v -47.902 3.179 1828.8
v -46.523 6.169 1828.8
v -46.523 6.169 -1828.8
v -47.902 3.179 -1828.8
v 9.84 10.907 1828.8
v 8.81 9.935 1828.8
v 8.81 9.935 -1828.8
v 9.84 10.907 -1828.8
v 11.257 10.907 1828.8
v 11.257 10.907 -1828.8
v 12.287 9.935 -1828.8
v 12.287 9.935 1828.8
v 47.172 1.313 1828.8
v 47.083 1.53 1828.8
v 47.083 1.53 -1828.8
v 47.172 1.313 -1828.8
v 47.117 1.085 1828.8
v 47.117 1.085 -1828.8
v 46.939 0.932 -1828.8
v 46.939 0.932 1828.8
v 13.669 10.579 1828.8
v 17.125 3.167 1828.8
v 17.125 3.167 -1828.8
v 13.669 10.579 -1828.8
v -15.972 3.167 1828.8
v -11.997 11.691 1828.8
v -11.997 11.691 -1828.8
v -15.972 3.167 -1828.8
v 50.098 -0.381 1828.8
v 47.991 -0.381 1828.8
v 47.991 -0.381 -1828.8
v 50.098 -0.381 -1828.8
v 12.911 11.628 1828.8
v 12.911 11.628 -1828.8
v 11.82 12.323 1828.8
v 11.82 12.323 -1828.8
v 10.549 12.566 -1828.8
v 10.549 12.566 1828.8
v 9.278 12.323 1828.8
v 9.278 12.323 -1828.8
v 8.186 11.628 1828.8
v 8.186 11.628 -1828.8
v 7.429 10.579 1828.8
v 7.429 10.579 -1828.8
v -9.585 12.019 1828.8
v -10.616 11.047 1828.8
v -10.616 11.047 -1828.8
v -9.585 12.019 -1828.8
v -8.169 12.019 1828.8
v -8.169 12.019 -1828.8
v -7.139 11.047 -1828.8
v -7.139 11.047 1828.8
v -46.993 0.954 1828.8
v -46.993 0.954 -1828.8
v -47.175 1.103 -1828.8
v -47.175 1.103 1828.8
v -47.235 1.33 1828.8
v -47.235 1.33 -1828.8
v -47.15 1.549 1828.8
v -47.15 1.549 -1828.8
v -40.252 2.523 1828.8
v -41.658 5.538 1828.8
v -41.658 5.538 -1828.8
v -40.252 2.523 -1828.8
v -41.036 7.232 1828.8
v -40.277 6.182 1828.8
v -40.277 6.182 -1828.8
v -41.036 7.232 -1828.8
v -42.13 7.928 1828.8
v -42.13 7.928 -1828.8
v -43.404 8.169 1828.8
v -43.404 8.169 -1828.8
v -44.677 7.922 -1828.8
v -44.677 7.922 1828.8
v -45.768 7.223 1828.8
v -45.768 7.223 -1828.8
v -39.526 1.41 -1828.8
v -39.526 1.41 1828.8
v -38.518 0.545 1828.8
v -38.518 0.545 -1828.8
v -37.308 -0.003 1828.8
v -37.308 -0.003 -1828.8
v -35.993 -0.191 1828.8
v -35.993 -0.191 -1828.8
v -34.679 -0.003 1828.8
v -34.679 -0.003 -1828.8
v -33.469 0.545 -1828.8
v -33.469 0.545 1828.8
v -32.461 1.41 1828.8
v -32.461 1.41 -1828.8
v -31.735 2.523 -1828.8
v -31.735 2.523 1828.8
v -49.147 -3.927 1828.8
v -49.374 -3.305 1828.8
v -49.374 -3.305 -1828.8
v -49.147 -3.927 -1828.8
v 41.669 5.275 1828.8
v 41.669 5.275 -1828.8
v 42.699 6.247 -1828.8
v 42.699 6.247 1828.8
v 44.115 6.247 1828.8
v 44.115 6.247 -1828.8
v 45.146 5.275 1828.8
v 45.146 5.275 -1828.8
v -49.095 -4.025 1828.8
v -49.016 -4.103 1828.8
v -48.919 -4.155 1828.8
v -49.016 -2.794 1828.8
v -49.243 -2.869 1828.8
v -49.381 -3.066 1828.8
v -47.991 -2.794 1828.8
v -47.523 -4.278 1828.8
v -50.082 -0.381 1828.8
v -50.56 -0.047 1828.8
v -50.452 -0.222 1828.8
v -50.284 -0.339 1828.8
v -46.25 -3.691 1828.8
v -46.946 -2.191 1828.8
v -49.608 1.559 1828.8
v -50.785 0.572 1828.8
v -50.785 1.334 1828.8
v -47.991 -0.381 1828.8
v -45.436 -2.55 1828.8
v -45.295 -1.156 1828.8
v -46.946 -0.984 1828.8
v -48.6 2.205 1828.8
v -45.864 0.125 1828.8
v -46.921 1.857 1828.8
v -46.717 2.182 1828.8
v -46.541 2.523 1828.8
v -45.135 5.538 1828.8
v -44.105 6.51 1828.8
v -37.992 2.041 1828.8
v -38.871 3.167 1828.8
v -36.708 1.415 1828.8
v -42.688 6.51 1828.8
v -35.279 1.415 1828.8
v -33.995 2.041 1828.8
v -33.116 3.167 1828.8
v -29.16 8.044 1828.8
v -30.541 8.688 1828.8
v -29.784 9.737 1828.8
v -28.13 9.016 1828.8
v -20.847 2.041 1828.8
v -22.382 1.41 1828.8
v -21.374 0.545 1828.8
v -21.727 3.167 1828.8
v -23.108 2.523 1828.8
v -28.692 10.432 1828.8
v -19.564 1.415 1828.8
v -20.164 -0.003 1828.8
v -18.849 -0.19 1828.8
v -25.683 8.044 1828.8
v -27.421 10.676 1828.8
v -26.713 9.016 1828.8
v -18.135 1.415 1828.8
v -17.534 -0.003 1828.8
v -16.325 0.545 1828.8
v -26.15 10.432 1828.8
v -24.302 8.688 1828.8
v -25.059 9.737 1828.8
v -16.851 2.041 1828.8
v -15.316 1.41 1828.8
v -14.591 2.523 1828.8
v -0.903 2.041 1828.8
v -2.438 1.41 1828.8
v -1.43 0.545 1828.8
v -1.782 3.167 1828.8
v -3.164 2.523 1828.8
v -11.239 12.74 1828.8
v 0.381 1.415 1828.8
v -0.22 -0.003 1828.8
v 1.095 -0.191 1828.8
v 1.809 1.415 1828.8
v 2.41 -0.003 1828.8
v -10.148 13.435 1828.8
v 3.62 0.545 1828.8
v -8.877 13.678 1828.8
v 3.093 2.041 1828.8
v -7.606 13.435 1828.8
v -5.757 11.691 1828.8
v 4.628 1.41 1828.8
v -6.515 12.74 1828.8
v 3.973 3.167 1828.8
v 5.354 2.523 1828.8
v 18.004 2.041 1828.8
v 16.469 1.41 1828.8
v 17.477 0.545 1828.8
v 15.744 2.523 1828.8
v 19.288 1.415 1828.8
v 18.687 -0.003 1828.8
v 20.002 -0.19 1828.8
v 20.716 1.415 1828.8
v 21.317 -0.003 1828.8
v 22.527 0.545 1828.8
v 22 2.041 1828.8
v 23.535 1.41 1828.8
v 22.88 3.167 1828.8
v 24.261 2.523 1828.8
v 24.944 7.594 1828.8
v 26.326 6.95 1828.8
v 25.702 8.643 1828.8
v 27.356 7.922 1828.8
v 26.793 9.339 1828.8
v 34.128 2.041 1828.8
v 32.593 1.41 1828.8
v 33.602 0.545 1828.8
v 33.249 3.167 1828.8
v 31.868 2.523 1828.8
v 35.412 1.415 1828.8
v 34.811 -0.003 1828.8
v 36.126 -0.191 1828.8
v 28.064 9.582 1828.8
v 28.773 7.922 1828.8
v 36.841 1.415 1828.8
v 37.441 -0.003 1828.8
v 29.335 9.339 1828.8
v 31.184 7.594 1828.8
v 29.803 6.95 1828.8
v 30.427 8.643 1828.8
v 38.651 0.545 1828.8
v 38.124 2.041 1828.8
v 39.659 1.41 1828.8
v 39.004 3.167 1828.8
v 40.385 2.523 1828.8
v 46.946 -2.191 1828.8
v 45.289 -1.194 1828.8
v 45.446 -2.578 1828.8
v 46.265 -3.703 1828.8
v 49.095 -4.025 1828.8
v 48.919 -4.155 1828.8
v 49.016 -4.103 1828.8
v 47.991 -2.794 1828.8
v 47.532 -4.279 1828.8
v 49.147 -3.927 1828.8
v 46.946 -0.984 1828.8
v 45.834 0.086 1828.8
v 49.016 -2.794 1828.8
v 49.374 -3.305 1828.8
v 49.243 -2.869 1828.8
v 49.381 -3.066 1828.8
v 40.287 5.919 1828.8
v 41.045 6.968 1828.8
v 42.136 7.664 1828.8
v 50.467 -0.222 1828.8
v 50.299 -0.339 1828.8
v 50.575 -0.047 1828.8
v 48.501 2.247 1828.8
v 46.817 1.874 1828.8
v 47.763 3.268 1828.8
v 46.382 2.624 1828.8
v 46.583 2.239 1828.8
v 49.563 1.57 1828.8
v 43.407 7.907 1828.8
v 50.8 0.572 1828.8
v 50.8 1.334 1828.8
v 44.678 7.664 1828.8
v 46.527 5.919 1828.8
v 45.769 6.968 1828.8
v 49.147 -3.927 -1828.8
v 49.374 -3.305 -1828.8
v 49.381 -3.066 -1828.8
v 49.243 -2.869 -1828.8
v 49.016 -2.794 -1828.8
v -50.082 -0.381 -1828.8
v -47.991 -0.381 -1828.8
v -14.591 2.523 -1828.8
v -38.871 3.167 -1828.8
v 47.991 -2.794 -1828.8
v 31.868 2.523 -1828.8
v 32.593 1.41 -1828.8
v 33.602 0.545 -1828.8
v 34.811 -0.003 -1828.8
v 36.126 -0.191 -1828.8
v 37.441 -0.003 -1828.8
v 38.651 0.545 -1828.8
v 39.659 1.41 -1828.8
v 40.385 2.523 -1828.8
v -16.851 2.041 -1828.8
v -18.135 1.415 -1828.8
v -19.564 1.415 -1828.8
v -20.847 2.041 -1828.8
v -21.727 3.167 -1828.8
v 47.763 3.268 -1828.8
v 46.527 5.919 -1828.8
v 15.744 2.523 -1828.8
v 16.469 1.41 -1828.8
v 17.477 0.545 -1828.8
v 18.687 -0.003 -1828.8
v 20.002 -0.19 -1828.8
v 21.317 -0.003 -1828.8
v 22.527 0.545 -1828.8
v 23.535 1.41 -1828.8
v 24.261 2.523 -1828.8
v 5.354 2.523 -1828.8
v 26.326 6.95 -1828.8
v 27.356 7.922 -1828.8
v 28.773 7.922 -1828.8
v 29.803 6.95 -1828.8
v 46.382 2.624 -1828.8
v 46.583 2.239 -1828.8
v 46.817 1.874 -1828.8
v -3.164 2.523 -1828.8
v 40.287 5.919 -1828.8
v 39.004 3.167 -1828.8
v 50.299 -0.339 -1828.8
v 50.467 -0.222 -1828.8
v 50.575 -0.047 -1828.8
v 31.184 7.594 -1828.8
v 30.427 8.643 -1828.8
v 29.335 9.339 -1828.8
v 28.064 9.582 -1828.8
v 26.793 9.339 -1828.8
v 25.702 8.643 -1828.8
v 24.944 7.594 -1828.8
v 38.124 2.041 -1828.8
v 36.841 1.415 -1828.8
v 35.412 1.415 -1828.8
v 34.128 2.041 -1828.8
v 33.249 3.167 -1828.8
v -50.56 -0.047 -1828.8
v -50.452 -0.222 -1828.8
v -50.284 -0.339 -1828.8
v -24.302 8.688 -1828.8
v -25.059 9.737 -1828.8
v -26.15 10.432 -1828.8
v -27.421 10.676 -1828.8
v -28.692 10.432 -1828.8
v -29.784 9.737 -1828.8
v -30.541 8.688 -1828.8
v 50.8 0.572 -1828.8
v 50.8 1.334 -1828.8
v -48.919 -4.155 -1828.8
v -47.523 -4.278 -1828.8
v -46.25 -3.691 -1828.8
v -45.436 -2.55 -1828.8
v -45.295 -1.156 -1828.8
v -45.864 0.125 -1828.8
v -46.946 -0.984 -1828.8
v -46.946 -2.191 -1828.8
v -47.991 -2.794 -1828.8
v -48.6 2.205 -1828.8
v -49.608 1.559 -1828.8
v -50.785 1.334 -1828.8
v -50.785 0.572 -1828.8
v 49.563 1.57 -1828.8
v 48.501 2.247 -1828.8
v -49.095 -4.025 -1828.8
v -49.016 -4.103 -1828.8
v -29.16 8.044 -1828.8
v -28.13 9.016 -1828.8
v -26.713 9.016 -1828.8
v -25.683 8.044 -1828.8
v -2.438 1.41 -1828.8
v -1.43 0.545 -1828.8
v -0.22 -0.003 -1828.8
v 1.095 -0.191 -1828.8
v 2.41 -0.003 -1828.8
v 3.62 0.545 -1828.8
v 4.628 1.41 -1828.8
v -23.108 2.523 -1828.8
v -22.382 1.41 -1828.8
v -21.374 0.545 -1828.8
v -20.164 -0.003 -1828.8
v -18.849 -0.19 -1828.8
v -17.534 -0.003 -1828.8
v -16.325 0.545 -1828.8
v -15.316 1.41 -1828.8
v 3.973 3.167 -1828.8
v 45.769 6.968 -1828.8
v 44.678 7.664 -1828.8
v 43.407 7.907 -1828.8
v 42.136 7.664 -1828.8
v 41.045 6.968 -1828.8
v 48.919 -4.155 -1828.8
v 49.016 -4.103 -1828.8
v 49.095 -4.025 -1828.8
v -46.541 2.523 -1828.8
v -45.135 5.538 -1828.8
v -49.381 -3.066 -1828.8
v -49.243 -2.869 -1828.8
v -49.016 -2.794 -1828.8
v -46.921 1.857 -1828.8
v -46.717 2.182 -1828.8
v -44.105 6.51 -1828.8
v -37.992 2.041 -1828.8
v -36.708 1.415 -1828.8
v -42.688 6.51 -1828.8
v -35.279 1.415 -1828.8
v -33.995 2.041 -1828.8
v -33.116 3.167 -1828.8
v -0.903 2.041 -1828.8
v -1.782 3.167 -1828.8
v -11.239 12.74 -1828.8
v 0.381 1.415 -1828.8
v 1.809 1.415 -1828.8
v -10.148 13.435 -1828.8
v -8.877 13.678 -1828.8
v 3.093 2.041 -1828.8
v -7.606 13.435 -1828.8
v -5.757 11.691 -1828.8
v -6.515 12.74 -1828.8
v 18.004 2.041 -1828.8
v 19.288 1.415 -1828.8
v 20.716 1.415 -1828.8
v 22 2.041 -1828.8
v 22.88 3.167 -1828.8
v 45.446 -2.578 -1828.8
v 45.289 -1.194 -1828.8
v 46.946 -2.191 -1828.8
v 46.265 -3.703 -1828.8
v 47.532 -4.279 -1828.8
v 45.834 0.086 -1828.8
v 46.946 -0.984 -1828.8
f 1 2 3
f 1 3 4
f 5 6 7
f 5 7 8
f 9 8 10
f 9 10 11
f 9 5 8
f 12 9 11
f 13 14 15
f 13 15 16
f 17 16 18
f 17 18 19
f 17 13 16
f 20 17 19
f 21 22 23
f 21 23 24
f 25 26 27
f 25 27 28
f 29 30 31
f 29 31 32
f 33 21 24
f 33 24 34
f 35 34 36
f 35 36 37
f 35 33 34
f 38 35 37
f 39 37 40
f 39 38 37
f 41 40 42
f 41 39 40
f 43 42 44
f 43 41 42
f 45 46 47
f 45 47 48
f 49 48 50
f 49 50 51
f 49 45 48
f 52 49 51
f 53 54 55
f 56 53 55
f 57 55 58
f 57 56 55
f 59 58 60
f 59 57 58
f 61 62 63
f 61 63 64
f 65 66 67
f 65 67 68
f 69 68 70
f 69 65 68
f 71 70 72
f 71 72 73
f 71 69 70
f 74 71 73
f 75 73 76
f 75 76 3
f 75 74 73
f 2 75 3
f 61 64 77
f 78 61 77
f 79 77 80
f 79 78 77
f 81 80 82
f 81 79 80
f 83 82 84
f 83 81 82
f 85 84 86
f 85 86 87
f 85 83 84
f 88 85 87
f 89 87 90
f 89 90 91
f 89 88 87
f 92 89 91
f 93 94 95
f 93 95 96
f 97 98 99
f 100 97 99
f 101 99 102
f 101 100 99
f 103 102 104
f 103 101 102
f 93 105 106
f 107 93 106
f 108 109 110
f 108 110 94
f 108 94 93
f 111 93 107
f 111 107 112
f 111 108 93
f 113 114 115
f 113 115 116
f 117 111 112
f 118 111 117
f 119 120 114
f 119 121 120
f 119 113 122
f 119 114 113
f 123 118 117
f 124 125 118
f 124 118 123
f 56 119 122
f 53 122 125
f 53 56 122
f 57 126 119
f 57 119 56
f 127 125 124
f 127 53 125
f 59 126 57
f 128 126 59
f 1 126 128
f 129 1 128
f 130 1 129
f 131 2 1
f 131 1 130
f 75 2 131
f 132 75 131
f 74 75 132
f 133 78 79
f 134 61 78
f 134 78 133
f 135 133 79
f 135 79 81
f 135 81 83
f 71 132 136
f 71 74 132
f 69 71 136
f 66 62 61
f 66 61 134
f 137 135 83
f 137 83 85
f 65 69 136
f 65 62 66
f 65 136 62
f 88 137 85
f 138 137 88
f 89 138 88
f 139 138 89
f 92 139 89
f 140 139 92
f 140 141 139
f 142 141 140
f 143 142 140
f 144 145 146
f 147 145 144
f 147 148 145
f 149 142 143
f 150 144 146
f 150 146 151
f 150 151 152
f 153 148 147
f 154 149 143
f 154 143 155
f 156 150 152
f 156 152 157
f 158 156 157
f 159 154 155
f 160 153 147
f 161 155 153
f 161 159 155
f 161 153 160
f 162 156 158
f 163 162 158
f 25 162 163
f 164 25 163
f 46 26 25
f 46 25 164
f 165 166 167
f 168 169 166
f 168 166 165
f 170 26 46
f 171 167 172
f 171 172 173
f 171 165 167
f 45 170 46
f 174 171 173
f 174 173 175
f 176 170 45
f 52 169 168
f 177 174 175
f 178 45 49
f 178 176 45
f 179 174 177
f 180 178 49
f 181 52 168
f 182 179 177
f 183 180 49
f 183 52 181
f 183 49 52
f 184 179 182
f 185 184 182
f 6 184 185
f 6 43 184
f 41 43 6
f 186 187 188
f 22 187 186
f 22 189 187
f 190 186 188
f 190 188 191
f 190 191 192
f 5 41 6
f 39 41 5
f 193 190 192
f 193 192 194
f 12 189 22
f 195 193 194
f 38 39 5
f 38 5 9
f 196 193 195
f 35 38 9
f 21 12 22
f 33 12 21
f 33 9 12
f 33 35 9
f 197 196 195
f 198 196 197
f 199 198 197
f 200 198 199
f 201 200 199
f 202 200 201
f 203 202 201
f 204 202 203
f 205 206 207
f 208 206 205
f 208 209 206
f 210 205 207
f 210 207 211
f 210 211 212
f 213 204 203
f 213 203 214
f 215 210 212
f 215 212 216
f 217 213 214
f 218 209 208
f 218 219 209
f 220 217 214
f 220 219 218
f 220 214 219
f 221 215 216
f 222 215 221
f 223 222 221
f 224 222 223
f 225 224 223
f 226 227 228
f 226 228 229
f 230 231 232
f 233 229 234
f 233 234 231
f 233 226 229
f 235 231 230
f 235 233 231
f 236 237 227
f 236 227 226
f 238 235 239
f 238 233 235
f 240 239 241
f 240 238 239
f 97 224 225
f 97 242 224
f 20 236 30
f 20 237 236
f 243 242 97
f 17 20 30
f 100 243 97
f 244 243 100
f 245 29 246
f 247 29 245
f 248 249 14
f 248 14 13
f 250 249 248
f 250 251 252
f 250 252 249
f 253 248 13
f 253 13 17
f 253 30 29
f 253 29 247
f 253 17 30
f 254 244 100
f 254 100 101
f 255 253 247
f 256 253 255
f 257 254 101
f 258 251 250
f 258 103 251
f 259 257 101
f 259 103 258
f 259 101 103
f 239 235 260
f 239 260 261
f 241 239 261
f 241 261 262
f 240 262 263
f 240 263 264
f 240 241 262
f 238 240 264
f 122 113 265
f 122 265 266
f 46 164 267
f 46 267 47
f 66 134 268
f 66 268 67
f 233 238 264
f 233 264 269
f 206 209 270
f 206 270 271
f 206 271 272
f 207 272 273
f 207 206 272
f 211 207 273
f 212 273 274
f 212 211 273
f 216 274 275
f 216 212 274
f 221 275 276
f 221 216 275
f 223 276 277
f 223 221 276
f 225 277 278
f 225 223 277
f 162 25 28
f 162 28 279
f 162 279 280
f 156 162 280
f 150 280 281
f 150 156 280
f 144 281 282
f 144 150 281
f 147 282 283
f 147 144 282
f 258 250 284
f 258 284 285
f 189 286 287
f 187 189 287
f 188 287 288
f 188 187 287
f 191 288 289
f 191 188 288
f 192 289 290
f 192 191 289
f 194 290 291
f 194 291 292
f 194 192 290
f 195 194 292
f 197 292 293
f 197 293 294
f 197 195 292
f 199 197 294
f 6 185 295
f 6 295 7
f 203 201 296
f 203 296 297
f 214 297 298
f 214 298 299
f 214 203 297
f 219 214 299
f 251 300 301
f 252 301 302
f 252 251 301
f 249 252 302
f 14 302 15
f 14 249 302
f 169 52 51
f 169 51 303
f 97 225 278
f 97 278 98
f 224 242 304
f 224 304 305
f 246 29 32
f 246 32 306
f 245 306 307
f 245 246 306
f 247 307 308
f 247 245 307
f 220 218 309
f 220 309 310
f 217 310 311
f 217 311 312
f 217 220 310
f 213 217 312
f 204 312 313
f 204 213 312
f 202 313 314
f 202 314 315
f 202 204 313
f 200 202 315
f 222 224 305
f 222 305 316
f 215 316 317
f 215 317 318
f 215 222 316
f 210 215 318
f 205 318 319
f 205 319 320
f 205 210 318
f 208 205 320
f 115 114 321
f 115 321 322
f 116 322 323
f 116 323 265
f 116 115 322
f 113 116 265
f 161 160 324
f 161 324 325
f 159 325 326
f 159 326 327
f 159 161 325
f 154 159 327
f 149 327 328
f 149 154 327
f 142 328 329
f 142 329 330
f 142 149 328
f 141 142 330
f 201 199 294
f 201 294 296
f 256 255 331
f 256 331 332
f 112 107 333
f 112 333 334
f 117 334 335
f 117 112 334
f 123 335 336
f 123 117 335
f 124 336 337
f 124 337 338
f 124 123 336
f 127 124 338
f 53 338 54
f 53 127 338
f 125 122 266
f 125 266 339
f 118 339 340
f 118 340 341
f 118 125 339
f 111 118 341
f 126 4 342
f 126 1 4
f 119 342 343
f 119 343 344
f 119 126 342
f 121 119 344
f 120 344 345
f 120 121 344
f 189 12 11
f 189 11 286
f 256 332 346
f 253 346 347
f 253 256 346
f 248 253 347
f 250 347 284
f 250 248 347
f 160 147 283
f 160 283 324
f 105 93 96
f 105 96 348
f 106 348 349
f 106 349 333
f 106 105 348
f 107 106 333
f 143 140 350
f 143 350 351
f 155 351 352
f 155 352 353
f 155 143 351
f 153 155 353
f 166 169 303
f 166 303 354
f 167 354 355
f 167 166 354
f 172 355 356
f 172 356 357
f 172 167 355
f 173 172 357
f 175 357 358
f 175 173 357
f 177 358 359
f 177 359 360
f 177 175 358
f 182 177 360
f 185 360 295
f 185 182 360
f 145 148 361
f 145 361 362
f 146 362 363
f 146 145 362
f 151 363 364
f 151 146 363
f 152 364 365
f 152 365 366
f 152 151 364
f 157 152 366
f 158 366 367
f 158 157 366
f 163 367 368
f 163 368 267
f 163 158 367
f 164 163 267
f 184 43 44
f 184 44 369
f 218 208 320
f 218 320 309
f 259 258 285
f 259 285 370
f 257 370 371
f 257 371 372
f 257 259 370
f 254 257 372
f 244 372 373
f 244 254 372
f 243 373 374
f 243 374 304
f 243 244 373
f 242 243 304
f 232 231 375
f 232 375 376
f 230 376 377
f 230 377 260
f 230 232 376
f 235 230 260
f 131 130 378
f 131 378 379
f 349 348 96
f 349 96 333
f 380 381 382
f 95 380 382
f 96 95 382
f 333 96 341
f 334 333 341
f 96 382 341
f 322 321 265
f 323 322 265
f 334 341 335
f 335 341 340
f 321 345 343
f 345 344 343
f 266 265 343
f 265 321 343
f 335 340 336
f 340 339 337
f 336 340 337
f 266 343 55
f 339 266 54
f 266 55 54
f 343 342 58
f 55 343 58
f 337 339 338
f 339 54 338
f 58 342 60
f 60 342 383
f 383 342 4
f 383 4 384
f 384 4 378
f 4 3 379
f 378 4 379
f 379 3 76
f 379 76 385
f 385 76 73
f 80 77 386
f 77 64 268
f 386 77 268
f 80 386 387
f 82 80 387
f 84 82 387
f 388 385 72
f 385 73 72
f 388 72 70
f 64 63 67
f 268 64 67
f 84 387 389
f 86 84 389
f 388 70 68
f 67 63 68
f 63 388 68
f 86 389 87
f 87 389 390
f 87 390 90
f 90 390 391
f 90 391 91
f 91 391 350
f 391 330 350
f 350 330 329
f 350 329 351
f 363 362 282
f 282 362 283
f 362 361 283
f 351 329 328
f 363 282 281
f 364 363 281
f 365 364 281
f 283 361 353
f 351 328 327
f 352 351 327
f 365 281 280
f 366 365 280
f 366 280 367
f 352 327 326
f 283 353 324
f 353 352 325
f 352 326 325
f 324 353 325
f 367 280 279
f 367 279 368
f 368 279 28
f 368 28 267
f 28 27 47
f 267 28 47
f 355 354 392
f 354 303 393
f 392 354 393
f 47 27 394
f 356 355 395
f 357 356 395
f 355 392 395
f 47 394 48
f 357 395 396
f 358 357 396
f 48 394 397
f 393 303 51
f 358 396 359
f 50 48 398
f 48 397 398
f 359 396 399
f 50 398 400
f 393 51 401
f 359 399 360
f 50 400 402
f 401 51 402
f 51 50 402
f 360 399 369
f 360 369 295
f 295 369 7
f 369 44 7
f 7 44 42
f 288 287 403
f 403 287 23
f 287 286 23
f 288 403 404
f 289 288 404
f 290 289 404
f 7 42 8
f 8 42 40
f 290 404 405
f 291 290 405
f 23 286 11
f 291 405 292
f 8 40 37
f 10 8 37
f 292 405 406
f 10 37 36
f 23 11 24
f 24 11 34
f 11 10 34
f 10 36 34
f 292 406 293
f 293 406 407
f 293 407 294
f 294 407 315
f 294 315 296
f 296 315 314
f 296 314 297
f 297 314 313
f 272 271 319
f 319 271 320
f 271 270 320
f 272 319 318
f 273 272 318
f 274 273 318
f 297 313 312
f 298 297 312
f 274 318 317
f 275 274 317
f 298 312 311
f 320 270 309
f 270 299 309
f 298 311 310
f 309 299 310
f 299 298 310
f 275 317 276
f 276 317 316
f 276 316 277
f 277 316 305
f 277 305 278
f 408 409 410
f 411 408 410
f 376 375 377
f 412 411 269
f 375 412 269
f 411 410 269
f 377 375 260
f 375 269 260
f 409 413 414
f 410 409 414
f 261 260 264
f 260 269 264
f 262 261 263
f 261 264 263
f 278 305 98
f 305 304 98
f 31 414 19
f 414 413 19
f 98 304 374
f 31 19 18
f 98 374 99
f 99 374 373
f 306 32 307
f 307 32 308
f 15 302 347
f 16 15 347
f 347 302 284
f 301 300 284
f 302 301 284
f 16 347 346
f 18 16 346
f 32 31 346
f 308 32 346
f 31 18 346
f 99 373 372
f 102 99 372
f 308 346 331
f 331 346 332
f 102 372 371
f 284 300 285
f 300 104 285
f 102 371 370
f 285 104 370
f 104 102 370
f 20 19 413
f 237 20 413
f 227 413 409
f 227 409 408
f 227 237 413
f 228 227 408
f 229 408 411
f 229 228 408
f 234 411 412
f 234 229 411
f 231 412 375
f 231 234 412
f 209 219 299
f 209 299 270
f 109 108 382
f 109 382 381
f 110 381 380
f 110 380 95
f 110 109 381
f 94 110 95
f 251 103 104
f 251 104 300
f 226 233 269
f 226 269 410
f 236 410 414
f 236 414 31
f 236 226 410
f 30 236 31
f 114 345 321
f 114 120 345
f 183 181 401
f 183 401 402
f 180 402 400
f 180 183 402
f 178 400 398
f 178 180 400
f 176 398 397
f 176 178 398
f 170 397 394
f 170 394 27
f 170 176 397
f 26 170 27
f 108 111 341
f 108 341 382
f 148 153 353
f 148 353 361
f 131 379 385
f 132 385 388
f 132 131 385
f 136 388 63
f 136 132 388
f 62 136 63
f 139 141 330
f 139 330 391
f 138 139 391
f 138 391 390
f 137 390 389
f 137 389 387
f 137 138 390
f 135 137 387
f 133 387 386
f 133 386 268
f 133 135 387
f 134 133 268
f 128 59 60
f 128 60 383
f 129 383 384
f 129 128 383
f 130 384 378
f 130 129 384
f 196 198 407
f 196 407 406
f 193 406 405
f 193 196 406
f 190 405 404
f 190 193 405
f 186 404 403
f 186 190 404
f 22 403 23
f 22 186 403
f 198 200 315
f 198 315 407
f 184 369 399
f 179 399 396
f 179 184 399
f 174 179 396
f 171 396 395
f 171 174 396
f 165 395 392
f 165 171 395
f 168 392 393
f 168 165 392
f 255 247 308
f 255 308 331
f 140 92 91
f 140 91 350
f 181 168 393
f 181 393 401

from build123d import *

# Parameters (mm, degrees)
BOSS_EXTRUDE1_DEPTH = 1828.8


with BuildPart() as part:
    # Sketch1 → Boss-Extrude1 (new body, symmetric)
    with BuildSketch(Plane.XY):
        with BuildLine():
            Line((-50.78476, 0.5715), (-50.559736774, -0.046746233))
            ThreePointArc((-50.559736774, -0.046746233), (-50.373749752, -0.289129238), (-50.082372922, -0.381))
            Line((-50.082372922, -0.381), (-47.99076, -0.381))
            ThreePointArc((-47.99076, -0.381), (-46.78426, -1.5875), (-47.99076, -2.794))
            Line((-47.99076, -2.794), (-49.015693786, -2.794))
            ThreePointArc((-49.015693786, -2.794), (-49.327790715, -2.956467378), (-49.373716675, -3.305309675))
            Line((-49.373716675, -3.305309675), (-49.14727152, -3.927462624))
            ThreePointArc((-49.14727152, -3.927462624), (-49.058345853, -4.066870737), (-48.918733274, -4.155475049))
            ThreePointArc((-48.918733274, -4.155475049), (-45.435630481, -2.550278994), (-46.993353033, 0.954312265))
            ThreePointArc((-46.993353033, 0.954312265), (-47.222592561, 1.211859281), (-47.15011647, 1.548947463))
            ThreePointArc((-47.15011647, 1.548947463), (-46.815832499, 2.017112771), (-46.541259709, 2.522616788))
            Line((-46.541259709, 2.522616788), (-45.135349464, 5.537601038))
            ThreePointArc((-45.135349464, 5.537601038), (-43.39673428, 6.645221066), (-41.658119097, 5.537601038))
            Line((-41.658119097, 5.537601038), (-40.252208852, 2.522616788))
            ThreePointArc((-40.252208852, 2.522616788), (-35.993468561, -0.1905), (-31.734728269, 2.522616788))
            Line((-31.734728269, 2.522616788), (-29.160039084, 8.044055564))
            ThreePointArc((-29.160039084, 8.044055564), (-27.4214239, 9.151675593), (-25.682808717, 8.044055564))
            Line((-25.682808717, 8.044055564), (-23.108119532, 2.522616788))
            ThreePointArc((-23.108119532, 2.522616788), (-18.84937924, -0.1905), (-14.590638949, 2.522616788))
            Line((-14.590638949, 2.522616788), (-10.61576511, 11.046761243))
            ThreePointArc((-10.61576511, 11.046761243), (-8.877149927, 12.154381272), (-7.138534743, 11.046761243))
            Line((-7.138534743, 11.046761243), (-3.163660904, 2.522616788))
            ThreePointArc((-3.163660904, 2.522616788), (1.095079387, -0.1905), (5.353819678, 2.522616788))
            Line((5.353819678, 2.522616788), (8.810059444, 9.934546884))
            ThreePointArc((8.810059444, 9.934546884), (10.548674627, 11.042166912), (12.287289811, 9.934546884))
            Line((12.287289811, 9.934546884), (15.743529576, 2.522616788))
            ThreePointArc((15.743529576, 2.522616788), (20.002269867, -0.1905), (24.261010159, 2.522616788))
            Line((24.261010159, 2.522616788), (26.3256628, 6.950278665))
            ThreePointArc((26.3256628, 6.950278665), (28.064277983, 8.057898694), (29.802893167, 6.950278665))
            Line((29.802893167, 6.950278665), (31.867545808, 2.522616788))
            ThreePointArc((31.867545808, 2.522616788), (36.126286099, -0.1905), (40.385026391, 2.522616788))
            Line((40.385026391, 2.522616788), (41.668563615, 5.275171249))
            ThreePointArc((41.668563615, 5.275171249), (43.407178799, 6.382791278), (45.145793982, 5.275171249))
            Line((45.145793982, 5.275171249), (46.382028178, 2.624058461))
            ThreePointArc((46.382028178, 2.624058461), (46.695888569, 2.053812951), (47.082925376, 1.530467179))
            ThreePointArc((47.082925376, 1.530467179), (47.162849135, 1.194920043), (46.939140922, 0.932366577))
            ThreePointArc((46.939140922, 0.932366577), (45.446088081, -2.577588419), (48.918733274, -4.155475049))
            ThreePointArc((48.918733274, -4.155475049), (49.058345853, -4.066870737), (49.14727152, -3.927462624))
            Line((49.14727152, -3.927462624), (49.373716675, -3.305309675))
            ThreePointArc((49.373716675, -3.305309675), (49.327790715, -2.956467378), (49.015693786, -2.794))
            Line((49.015693786, -2.794), (47.99076, -2.794))
            ThreePointArc((47.99076, -2.794), (46.78426, -1.5875), (47.99076, -0.381))
            Line((47.99076, -0.381), (50.097612922, -0.381))
            ThreePointArc((50.097612922, -0.381), (50.388989752, -0.289129238), (50.574976774, -0.046746233))
            Line((50.574976774, -0.046746233), (50.8, 0.5715))
            Line((50.8, 0.5715), (50.8, 1.3335))
            ThreePointArc((50.8, 1.3335), (48.999674203, 1.858247117), (47.763241246, 3.268128692))
            Line((47.763241246, 3.268128692), (46.52700705, 5.91924148))
            ThreePointArc((46.52700705, 5.91924148), (43.407178799, 7.906791278), (40.287350548, 5.91924148))
            Line((40.287350548, 5.91924148), (39.003813323, 3.166687019))
            ThreePointArc((39.003813323, 3.166687019), (36.126286099, 1.3335), (33.248758876, 3.166687019))
            Line((33.248758876, 3.166687019), (31.184106234, 7.594348896))
            ThreePointArc((31.184106234, 7.594348896), (28.064277983, 9.581898694), (24.944449732, 7.594348896))
            Line((24.944449732, 7.594348896), (22.879797091, 3.166687019))
            ThreePointArc((22.879797091, 3.166687019), (20.002269867, 1.3335), (17.124742644, 3.166687019))
            Line((17.124742644, 3.166687019), (13.668502878, 10.578617115))
            ThreePointArc((13.668502878, 10.578617115), (10.548674627, 12.566166912), (7.428846376, 10.578617115))
            Line((7.428846376, 10.578617115), (3.972606611, 3.166687019))
            ThreePointArc((3.972606611, 3.166687019), (1.095079387, 1.3335), (-1.782447837, 3.166687019))
            Line((-1.782447837, 3.166687019), (-5.757321676, 11.690831474))
            ThreePointArc((-5.757321676, 11.690831474), (-8.877149927, 13.678381272), (-11.996978178, 11.690831474))
            Line((-11.996978178, 11.690831474), (-15.971852016, 3.166687019))
            ThreePointArc((-15.971852016, 3.166687019), (-18.84937924, 1.3335), (-21.726906464, 3.166687019))
            Line((-21.726906464, 3.166687019), (-24.30159565, 8.688125795))
            ThreePointArc((-24.30159565, 8.688125795), (-27.4214239, 10.675675593), (-30.541252151, 8.688125795))
            Line((-30.541252151, 8.688125795), (-33.115941337, 3.166687019))
            ThreePointArc((-33.115941337, 3.166687019), (-35.993468561, 1.3335), (-38.870995784, 3.166687019))
            Line((-38.870995784, 3.166687019), (-40.276906029, 6.181671269))
            ThreePointArc((-40.276906029, 6.181671269), (-43.403924246, 8.169213557), (-46.522612518, 6.168625961))
            Line((-46.522612518, 6.168625961), (-47.901652661, 3.178719165))
            ThreePointArc((-47.901652661, 3.178719165), (-49.073244466, 1.834301134), (-50.78476, 1.3335))
            Line((-50.78476, 1.3335), (-50.78476, 0.5715))
        make_face()
    extrude(amount=BOSS_EXTRUDE1_DEPTH, both=True)


solid = part.part
